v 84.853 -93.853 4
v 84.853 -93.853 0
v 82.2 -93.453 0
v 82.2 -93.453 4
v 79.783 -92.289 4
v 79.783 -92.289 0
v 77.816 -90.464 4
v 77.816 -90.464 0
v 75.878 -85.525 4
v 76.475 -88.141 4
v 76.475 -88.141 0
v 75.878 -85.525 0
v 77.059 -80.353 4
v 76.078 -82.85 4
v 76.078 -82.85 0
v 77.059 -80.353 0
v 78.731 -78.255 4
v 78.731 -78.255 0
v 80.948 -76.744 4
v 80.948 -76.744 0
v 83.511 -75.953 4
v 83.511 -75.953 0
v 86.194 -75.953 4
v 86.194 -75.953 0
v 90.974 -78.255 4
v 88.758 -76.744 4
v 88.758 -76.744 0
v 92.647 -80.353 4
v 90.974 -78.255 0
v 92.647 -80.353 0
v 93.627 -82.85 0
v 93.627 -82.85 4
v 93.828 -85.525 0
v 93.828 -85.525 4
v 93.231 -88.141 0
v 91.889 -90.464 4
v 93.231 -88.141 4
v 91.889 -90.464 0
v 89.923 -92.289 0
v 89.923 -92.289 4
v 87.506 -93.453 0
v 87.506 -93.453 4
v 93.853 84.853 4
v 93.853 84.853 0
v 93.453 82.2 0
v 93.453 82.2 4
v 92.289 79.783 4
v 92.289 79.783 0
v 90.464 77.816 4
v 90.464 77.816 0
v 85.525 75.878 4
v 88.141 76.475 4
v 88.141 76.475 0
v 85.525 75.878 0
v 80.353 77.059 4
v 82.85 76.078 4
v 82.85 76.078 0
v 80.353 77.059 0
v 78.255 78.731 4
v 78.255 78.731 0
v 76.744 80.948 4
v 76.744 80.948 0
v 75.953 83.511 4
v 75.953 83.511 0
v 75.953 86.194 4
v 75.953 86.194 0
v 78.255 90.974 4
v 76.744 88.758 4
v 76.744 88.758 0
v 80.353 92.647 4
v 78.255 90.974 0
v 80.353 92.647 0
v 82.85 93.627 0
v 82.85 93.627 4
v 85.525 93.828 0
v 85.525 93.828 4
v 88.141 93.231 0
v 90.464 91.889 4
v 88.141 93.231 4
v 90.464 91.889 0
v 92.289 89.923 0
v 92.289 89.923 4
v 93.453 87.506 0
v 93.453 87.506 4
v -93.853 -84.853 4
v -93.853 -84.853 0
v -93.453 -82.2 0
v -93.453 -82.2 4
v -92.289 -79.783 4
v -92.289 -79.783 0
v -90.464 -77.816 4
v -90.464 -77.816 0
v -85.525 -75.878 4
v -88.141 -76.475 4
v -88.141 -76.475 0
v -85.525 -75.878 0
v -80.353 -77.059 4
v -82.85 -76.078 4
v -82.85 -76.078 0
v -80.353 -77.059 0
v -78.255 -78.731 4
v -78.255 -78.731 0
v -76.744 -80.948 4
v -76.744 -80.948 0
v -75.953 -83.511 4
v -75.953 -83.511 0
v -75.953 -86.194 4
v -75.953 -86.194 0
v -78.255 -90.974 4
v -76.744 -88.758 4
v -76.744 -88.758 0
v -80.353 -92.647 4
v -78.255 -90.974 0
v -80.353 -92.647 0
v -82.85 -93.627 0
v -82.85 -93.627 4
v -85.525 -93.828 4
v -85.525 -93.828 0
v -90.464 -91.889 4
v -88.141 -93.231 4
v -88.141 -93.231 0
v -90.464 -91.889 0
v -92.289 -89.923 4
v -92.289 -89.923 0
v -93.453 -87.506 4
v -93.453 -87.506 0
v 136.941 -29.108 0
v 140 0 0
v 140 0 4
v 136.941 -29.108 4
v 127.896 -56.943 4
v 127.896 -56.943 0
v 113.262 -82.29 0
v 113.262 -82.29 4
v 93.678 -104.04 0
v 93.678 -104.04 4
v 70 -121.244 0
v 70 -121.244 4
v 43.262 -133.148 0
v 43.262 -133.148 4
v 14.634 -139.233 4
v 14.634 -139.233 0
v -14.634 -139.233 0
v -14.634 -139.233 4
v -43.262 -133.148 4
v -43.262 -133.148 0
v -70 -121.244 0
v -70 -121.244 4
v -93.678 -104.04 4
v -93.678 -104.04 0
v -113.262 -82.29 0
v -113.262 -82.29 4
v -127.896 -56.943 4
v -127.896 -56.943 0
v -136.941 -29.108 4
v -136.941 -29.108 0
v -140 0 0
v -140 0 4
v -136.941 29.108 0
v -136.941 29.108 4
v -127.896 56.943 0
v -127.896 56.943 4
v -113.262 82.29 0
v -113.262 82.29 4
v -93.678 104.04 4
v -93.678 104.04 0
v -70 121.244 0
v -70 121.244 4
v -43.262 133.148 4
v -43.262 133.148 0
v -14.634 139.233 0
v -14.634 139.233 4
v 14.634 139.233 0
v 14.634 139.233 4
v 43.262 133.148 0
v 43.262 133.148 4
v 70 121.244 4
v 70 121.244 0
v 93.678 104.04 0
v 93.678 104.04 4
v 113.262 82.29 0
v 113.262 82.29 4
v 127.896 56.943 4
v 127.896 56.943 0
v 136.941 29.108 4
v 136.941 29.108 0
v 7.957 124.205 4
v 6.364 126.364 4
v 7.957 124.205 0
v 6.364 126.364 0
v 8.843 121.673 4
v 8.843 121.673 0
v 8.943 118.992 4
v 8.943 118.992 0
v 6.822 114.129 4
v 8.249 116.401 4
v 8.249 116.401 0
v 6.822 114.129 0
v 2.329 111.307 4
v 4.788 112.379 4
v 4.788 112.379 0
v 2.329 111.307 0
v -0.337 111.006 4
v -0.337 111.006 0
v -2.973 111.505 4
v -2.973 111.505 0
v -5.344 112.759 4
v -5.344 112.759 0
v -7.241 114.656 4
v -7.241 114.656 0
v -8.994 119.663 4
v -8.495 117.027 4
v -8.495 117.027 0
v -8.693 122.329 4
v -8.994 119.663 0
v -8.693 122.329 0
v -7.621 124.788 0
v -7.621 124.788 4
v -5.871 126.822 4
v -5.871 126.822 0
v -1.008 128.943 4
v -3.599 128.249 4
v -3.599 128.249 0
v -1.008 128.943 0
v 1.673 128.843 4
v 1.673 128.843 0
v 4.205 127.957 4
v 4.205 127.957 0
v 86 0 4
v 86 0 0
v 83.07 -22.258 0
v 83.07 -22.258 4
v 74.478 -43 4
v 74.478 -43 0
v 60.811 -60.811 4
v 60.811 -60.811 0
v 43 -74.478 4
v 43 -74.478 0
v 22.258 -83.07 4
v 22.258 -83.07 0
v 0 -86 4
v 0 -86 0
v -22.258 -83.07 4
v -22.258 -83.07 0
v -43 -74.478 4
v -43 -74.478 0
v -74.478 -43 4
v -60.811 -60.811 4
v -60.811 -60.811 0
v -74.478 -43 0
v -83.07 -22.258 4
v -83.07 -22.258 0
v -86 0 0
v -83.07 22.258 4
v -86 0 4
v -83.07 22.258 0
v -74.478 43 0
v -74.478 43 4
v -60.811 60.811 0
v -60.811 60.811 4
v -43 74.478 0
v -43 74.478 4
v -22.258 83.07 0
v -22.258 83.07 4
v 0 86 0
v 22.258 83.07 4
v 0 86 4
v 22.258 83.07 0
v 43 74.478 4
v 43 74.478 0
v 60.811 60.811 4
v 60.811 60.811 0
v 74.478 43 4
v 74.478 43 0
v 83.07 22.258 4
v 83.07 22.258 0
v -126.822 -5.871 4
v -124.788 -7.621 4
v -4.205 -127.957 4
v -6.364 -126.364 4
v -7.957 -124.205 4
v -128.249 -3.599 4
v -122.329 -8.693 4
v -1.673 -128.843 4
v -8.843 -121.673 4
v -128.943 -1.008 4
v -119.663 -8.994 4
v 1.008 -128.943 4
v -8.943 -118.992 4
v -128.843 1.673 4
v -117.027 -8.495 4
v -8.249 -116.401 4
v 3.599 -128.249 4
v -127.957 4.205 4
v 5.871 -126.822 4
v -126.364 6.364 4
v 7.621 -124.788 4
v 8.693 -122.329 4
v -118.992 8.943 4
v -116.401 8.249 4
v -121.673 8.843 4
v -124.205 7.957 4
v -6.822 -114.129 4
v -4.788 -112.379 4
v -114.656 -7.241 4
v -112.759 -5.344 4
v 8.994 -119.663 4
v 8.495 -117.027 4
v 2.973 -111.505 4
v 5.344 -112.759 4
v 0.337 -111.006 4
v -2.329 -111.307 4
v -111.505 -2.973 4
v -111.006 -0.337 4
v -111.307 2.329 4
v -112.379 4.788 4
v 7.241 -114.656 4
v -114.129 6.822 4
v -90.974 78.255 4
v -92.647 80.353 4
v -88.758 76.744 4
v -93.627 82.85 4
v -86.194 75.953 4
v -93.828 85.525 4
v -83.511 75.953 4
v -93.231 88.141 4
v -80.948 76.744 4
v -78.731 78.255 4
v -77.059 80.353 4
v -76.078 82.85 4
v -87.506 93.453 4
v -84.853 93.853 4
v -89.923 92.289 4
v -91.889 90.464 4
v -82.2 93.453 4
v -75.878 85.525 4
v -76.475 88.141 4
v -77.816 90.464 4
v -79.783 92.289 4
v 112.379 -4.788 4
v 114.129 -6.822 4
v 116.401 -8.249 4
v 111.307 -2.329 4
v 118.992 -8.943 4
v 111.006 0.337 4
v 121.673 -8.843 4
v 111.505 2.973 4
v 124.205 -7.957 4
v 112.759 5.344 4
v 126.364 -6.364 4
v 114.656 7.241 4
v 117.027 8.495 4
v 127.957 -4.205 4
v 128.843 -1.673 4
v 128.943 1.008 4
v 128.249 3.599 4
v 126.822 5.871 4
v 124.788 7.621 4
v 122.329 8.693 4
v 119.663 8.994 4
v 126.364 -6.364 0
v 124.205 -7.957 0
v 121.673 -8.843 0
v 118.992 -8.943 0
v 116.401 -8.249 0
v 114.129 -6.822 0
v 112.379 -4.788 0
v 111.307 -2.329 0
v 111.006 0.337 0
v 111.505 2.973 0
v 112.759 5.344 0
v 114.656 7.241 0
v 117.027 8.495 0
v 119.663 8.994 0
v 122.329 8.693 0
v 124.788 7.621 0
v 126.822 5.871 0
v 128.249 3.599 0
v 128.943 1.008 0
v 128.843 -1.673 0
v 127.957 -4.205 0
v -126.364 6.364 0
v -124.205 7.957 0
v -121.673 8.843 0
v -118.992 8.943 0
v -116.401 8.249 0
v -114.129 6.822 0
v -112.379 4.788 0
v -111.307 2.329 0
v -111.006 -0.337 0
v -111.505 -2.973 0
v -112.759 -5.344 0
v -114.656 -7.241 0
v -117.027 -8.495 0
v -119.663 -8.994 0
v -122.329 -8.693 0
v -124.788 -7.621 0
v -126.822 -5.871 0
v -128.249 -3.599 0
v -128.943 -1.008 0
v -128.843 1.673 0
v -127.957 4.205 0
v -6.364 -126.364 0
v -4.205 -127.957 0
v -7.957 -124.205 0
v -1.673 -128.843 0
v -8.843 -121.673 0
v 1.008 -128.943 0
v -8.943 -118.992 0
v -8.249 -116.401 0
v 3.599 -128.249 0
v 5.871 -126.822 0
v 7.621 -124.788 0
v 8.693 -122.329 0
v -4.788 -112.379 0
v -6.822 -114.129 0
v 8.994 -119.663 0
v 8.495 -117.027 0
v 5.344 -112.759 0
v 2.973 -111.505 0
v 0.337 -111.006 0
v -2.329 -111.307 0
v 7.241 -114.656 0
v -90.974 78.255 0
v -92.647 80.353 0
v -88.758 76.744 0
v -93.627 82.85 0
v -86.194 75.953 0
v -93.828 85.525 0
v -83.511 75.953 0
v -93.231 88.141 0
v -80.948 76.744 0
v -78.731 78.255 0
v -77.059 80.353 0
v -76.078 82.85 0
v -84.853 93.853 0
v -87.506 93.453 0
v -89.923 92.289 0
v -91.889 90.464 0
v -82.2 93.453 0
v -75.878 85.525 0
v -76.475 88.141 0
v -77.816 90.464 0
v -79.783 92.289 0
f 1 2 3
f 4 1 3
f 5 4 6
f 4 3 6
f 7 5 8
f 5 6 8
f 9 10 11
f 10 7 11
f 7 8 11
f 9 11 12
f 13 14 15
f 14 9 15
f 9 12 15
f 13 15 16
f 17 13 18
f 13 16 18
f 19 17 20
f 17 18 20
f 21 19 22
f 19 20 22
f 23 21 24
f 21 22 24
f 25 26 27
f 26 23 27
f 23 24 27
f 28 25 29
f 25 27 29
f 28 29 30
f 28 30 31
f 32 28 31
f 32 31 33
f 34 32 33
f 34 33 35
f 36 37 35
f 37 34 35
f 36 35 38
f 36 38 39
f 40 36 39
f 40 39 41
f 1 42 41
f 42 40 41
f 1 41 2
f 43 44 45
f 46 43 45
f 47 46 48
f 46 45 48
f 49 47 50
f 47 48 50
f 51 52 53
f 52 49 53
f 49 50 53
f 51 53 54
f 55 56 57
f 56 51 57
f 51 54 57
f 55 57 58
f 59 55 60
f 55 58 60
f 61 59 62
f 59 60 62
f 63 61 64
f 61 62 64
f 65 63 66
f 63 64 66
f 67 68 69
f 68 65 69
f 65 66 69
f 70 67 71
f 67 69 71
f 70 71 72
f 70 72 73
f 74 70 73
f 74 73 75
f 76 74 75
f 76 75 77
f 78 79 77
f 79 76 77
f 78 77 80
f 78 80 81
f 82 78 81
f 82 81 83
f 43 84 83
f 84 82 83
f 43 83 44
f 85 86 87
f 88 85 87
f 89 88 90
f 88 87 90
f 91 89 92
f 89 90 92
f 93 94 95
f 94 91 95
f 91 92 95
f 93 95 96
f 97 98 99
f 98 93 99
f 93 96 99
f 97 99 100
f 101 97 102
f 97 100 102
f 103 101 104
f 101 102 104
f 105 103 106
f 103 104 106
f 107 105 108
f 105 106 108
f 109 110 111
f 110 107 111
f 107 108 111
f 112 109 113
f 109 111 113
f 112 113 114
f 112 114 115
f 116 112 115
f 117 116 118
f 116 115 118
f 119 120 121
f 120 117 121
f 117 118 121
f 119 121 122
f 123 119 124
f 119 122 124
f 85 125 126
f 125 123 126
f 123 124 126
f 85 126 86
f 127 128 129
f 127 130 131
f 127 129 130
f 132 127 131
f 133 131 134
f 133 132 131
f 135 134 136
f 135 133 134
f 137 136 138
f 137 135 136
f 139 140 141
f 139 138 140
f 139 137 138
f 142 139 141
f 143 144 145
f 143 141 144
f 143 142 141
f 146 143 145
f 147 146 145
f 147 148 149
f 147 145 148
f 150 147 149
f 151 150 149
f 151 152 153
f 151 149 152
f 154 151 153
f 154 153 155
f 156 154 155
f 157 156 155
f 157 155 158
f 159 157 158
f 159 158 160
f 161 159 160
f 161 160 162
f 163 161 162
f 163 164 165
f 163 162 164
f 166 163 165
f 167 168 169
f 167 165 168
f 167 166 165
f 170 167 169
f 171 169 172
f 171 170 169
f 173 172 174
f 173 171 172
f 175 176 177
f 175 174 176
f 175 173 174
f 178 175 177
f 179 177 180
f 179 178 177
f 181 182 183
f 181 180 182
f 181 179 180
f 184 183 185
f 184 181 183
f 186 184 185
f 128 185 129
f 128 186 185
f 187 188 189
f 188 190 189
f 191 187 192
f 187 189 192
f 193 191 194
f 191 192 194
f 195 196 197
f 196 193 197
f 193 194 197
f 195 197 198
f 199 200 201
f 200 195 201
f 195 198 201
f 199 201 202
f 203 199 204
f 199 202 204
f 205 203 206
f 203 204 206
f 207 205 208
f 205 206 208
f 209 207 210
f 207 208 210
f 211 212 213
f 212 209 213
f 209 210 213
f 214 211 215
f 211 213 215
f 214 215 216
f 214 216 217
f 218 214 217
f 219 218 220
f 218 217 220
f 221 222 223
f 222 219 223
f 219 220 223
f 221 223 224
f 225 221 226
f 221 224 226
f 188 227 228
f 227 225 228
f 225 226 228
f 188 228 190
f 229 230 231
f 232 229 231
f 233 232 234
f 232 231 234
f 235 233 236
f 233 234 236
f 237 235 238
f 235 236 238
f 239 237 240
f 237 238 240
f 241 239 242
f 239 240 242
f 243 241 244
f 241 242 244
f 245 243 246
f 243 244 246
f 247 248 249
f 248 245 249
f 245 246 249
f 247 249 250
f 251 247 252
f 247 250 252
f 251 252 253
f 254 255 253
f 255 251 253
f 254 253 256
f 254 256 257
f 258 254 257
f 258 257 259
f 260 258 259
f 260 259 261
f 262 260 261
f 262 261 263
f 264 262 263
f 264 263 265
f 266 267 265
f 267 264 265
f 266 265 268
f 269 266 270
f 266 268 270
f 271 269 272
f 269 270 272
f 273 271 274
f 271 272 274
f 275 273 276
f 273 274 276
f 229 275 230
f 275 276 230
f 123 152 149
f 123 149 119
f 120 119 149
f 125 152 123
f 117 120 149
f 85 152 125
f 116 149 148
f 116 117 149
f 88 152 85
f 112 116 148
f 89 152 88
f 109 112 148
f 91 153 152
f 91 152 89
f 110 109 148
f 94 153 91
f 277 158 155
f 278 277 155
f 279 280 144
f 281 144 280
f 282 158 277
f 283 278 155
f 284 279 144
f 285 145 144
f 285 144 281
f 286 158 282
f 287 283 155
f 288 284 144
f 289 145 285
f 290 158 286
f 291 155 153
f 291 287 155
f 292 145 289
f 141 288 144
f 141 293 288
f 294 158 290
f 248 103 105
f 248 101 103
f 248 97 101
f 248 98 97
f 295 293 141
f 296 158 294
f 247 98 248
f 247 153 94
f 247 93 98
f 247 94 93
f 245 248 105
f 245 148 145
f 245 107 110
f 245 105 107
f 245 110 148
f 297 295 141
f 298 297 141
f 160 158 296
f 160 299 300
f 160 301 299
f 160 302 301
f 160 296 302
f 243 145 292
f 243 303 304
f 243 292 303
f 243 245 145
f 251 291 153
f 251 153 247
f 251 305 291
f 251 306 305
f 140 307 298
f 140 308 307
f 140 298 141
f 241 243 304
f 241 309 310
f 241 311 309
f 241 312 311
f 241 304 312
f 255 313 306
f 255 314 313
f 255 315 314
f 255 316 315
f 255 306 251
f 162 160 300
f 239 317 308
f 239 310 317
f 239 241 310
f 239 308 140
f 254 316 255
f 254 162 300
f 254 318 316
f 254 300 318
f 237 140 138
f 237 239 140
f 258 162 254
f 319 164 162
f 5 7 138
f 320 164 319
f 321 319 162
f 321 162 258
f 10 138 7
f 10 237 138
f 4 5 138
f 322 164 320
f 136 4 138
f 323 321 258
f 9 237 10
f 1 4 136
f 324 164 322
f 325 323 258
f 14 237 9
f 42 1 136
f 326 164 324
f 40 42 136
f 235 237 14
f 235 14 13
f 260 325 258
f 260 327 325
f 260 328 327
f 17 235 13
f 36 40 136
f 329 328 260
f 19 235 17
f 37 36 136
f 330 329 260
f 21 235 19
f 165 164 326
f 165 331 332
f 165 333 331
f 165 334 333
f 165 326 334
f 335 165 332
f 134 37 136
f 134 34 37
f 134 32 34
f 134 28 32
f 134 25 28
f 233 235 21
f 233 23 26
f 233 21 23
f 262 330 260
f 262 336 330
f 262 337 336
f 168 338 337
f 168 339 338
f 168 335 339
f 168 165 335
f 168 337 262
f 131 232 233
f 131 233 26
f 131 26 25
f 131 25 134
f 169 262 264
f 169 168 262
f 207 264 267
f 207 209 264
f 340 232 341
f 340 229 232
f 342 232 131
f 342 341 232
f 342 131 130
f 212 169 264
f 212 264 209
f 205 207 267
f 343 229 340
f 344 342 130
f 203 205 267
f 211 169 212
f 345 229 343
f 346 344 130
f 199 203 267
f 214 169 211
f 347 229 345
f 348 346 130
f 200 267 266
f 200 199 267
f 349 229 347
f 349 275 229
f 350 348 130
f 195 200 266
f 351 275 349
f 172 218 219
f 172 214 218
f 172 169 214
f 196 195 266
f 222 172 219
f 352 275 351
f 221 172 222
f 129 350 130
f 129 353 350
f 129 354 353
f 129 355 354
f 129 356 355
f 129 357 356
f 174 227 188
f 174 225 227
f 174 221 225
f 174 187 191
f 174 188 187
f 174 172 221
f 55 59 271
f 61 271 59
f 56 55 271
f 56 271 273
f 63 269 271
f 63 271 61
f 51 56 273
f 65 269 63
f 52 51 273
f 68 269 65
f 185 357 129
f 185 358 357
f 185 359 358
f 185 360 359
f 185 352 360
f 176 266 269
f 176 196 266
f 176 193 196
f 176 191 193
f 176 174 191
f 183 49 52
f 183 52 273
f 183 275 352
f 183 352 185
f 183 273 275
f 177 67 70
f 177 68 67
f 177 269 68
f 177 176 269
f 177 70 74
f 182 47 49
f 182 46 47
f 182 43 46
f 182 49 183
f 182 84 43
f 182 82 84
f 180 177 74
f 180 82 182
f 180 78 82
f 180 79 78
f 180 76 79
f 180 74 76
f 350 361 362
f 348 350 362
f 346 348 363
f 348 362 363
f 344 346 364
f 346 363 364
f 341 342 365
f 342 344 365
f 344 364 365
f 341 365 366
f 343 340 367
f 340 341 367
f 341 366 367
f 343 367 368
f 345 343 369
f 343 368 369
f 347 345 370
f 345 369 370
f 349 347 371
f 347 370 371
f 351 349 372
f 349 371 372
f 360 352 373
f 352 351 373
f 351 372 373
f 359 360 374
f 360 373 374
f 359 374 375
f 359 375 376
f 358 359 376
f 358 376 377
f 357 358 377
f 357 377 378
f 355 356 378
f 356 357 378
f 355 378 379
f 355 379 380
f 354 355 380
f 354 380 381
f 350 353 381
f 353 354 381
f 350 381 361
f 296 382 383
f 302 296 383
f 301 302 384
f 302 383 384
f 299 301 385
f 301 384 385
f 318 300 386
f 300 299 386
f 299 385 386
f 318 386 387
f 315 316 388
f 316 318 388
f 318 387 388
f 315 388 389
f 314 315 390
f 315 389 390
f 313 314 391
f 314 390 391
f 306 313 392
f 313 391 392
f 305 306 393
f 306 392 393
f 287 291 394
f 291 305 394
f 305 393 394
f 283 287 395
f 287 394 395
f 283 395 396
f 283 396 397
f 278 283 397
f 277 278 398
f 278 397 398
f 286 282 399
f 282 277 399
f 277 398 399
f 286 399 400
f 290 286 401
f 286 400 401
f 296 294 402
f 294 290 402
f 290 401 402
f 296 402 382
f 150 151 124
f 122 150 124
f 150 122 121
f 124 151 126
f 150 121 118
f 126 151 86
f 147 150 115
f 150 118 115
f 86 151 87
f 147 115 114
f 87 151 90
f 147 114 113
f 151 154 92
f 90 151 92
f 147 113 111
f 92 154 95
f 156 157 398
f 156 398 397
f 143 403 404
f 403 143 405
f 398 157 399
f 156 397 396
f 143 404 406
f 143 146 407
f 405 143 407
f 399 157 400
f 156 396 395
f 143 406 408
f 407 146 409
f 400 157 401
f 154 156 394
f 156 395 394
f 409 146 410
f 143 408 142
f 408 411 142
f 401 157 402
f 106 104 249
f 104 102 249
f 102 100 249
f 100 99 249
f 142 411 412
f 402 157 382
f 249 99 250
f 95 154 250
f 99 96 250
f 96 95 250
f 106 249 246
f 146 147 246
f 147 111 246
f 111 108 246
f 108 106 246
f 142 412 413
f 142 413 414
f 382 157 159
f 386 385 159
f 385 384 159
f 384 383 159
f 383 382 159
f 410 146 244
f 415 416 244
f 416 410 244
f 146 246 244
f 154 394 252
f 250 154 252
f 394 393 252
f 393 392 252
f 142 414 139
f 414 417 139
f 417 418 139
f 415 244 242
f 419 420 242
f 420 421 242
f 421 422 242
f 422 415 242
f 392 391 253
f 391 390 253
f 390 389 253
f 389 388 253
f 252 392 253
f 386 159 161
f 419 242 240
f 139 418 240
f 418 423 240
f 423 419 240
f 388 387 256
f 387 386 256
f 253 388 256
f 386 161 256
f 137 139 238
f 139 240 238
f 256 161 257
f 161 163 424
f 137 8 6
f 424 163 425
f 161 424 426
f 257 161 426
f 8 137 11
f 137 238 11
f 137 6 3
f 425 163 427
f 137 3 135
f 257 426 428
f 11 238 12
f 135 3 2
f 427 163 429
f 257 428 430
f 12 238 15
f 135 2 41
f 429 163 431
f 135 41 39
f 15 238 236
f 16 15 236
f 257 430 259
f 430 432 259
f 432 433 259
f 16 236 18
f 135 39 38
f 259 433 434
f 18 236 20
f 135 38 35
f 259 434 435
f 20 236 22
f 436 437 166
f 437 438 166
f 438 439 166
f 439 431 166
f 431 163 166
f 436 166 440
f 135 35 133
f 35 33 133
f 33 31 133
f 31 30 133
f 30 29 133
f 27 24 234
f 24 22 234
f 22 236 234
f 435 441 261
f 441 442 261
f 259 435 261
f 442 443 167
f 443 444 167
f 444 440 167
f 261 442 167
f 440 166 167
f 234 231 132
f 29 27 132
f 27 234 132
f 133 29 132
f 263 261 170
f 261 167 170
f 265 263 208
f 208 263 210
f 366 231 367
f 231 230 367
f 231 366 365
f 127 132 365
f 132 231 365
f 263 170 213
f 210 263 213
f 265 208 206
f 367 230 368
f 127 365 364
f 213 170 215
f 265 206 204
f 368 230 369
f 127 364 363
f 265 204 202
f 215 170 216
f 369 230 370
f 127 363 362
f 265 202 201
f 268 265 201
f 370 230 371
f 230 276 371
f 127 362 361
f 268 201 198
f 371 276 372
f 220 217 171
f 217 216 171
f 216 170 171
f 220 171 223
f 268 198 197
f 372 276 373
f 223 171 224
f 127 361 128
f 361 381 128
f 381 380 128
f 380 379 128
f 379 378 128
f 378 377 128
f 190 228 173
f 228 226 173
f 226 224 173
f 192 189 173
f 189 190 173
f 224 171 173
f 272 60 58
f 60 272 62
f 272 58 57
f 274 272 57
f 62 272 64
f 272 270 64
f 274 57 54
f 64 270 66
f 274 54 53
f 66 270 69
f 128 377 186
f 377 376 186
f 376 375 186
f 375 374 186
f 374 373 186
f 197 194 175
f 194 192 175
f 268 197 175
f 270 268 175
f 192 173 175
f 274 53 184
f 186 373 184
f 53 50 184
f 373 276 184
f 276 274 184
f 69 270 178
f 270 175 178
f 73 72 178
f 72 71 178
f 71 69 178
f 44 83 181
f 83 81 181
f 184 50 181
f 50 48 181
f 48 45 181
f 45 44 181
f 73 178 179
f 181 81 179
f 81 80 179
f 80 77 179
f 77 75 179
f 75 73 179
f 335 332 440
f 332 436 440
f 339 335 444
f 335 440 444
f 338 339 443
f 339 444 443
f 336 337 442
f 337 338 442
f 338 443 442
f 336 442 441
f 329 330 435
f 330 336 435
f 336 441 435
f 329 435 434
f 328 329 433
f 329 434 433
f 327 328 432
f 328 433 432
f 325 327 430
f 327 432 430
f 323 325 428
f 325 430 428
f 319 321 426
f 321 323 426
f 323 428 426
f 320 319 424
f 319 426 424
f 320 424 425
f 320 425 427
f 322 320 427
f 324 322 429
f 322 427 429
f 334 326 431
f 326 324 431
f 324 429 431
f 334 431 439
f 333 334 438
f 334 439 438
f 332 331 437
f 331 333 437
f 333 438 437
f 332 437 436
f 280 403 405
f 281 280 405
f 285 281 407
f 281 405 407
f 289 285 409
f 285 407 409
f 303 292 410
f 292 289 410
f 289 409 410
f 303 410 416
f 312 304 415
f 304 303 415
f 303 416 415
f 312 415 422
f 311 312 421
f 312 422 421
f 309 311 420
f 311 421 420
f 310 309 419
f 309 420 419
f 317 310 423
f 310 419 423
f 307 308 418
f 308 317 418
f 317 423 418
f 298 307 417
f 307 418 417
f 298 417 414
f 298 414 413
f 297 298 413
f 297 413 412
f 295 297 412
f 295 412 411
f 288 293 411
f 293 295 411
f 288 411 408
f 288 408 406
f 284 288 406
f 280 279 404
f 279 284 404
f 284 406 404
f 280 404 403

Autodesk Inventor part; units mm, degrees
ref_plane "YZ Plane" through (0, 0, 0) normal (1, 0, 0) x (0, 1, 0)
ref_plane "XZ Plane" through (0, 0, 0) normal (0, 1, 0) x (-1, 0, 0)
ref_plane "XY Plane" through (0, 0, 0) normal (0, 0, 1) x (1, 0, 0)
sketch "Sketch1" plane through (0, 0, 0) normal (0, 0, 1) x (1, 0, 0)
  circle A0 centre (0, 0) radius 86
  circle A1 centre (0, 0) radius 140
  line L0 (98.9949, -98.9949) -> (-98.9949, 98.9949) construction
  line L1 (-98.9949, -98.9949) -> (98.9949, 98.9949) construction
  point P0 (0, 86)
  dimension "d44" = 172
  dimension "d23" = 280
extrude "Plate1" add sketch "Sketch1" along normal blind 4
sketch "Sketch6" plane through (0, 0, 0) normal (0, 0, 1) x (1, 0, 0)
  line L0 (0, 0) -> (0, 120) construction
  circle A0 centre (0, 0) radius 120 construction
  line L1 (0, 0) -> (84.8528, 84.8528) construction
  circle A1 centre (84.8528, 84.8528) radius 9
  dimension "d32" = 18
  dimension "d33" = 240
  dimension "d34" = 45
extrude "Cut2" cut sketch "Sketch6" along normal blind 4
pattern_circular "Circular Pattern2" count 8 over 360 about axis through (0, 0, -10) along (0, 0, -1) of "Cut2"
equation "\"d23\" = Flange_D_outer"
equation "\"d32\" = Flange_d_hole_diam"
equation "\"d33\" = Flange_D1_hole_center"
equation "\"d35\" = Thickness"
equation "\"d2\" = Thickness"
equation "\"BendReliefWidth\" = Thickness"
equation "\"BendReliefDepth\" = 0.5 * Thickness"
equation "\"CornerReliefSize\" = 4 * Thickness"
equation "\"MinimumRemnant\" = 2 * Thickness"
equation "\"TransitionRadius\" = BendRadius"
equation "\"JacobiRadiusSize\" = BendRadius"
equation "\"GapSize\" = Thickness"
equation "\"Octaeder_side\" = d41"
equation "\"Octaeder_flange_lenth\" = d42"
equation "\"Flange_D_outer\" = 280"
equation "\"Flange_d_hole_diam\" = 18"
equation "\"Flange_D1_hole_center\" = 240"
equation "\"Thickness\" = 4"
equation "\"BendRadius\" = 6"
equation "\"d41\" = 55.918831"
equation "\"d42\" = 72.5"
properties part number "DSB 112 drain system loose flange" material "Stainless Steel"
